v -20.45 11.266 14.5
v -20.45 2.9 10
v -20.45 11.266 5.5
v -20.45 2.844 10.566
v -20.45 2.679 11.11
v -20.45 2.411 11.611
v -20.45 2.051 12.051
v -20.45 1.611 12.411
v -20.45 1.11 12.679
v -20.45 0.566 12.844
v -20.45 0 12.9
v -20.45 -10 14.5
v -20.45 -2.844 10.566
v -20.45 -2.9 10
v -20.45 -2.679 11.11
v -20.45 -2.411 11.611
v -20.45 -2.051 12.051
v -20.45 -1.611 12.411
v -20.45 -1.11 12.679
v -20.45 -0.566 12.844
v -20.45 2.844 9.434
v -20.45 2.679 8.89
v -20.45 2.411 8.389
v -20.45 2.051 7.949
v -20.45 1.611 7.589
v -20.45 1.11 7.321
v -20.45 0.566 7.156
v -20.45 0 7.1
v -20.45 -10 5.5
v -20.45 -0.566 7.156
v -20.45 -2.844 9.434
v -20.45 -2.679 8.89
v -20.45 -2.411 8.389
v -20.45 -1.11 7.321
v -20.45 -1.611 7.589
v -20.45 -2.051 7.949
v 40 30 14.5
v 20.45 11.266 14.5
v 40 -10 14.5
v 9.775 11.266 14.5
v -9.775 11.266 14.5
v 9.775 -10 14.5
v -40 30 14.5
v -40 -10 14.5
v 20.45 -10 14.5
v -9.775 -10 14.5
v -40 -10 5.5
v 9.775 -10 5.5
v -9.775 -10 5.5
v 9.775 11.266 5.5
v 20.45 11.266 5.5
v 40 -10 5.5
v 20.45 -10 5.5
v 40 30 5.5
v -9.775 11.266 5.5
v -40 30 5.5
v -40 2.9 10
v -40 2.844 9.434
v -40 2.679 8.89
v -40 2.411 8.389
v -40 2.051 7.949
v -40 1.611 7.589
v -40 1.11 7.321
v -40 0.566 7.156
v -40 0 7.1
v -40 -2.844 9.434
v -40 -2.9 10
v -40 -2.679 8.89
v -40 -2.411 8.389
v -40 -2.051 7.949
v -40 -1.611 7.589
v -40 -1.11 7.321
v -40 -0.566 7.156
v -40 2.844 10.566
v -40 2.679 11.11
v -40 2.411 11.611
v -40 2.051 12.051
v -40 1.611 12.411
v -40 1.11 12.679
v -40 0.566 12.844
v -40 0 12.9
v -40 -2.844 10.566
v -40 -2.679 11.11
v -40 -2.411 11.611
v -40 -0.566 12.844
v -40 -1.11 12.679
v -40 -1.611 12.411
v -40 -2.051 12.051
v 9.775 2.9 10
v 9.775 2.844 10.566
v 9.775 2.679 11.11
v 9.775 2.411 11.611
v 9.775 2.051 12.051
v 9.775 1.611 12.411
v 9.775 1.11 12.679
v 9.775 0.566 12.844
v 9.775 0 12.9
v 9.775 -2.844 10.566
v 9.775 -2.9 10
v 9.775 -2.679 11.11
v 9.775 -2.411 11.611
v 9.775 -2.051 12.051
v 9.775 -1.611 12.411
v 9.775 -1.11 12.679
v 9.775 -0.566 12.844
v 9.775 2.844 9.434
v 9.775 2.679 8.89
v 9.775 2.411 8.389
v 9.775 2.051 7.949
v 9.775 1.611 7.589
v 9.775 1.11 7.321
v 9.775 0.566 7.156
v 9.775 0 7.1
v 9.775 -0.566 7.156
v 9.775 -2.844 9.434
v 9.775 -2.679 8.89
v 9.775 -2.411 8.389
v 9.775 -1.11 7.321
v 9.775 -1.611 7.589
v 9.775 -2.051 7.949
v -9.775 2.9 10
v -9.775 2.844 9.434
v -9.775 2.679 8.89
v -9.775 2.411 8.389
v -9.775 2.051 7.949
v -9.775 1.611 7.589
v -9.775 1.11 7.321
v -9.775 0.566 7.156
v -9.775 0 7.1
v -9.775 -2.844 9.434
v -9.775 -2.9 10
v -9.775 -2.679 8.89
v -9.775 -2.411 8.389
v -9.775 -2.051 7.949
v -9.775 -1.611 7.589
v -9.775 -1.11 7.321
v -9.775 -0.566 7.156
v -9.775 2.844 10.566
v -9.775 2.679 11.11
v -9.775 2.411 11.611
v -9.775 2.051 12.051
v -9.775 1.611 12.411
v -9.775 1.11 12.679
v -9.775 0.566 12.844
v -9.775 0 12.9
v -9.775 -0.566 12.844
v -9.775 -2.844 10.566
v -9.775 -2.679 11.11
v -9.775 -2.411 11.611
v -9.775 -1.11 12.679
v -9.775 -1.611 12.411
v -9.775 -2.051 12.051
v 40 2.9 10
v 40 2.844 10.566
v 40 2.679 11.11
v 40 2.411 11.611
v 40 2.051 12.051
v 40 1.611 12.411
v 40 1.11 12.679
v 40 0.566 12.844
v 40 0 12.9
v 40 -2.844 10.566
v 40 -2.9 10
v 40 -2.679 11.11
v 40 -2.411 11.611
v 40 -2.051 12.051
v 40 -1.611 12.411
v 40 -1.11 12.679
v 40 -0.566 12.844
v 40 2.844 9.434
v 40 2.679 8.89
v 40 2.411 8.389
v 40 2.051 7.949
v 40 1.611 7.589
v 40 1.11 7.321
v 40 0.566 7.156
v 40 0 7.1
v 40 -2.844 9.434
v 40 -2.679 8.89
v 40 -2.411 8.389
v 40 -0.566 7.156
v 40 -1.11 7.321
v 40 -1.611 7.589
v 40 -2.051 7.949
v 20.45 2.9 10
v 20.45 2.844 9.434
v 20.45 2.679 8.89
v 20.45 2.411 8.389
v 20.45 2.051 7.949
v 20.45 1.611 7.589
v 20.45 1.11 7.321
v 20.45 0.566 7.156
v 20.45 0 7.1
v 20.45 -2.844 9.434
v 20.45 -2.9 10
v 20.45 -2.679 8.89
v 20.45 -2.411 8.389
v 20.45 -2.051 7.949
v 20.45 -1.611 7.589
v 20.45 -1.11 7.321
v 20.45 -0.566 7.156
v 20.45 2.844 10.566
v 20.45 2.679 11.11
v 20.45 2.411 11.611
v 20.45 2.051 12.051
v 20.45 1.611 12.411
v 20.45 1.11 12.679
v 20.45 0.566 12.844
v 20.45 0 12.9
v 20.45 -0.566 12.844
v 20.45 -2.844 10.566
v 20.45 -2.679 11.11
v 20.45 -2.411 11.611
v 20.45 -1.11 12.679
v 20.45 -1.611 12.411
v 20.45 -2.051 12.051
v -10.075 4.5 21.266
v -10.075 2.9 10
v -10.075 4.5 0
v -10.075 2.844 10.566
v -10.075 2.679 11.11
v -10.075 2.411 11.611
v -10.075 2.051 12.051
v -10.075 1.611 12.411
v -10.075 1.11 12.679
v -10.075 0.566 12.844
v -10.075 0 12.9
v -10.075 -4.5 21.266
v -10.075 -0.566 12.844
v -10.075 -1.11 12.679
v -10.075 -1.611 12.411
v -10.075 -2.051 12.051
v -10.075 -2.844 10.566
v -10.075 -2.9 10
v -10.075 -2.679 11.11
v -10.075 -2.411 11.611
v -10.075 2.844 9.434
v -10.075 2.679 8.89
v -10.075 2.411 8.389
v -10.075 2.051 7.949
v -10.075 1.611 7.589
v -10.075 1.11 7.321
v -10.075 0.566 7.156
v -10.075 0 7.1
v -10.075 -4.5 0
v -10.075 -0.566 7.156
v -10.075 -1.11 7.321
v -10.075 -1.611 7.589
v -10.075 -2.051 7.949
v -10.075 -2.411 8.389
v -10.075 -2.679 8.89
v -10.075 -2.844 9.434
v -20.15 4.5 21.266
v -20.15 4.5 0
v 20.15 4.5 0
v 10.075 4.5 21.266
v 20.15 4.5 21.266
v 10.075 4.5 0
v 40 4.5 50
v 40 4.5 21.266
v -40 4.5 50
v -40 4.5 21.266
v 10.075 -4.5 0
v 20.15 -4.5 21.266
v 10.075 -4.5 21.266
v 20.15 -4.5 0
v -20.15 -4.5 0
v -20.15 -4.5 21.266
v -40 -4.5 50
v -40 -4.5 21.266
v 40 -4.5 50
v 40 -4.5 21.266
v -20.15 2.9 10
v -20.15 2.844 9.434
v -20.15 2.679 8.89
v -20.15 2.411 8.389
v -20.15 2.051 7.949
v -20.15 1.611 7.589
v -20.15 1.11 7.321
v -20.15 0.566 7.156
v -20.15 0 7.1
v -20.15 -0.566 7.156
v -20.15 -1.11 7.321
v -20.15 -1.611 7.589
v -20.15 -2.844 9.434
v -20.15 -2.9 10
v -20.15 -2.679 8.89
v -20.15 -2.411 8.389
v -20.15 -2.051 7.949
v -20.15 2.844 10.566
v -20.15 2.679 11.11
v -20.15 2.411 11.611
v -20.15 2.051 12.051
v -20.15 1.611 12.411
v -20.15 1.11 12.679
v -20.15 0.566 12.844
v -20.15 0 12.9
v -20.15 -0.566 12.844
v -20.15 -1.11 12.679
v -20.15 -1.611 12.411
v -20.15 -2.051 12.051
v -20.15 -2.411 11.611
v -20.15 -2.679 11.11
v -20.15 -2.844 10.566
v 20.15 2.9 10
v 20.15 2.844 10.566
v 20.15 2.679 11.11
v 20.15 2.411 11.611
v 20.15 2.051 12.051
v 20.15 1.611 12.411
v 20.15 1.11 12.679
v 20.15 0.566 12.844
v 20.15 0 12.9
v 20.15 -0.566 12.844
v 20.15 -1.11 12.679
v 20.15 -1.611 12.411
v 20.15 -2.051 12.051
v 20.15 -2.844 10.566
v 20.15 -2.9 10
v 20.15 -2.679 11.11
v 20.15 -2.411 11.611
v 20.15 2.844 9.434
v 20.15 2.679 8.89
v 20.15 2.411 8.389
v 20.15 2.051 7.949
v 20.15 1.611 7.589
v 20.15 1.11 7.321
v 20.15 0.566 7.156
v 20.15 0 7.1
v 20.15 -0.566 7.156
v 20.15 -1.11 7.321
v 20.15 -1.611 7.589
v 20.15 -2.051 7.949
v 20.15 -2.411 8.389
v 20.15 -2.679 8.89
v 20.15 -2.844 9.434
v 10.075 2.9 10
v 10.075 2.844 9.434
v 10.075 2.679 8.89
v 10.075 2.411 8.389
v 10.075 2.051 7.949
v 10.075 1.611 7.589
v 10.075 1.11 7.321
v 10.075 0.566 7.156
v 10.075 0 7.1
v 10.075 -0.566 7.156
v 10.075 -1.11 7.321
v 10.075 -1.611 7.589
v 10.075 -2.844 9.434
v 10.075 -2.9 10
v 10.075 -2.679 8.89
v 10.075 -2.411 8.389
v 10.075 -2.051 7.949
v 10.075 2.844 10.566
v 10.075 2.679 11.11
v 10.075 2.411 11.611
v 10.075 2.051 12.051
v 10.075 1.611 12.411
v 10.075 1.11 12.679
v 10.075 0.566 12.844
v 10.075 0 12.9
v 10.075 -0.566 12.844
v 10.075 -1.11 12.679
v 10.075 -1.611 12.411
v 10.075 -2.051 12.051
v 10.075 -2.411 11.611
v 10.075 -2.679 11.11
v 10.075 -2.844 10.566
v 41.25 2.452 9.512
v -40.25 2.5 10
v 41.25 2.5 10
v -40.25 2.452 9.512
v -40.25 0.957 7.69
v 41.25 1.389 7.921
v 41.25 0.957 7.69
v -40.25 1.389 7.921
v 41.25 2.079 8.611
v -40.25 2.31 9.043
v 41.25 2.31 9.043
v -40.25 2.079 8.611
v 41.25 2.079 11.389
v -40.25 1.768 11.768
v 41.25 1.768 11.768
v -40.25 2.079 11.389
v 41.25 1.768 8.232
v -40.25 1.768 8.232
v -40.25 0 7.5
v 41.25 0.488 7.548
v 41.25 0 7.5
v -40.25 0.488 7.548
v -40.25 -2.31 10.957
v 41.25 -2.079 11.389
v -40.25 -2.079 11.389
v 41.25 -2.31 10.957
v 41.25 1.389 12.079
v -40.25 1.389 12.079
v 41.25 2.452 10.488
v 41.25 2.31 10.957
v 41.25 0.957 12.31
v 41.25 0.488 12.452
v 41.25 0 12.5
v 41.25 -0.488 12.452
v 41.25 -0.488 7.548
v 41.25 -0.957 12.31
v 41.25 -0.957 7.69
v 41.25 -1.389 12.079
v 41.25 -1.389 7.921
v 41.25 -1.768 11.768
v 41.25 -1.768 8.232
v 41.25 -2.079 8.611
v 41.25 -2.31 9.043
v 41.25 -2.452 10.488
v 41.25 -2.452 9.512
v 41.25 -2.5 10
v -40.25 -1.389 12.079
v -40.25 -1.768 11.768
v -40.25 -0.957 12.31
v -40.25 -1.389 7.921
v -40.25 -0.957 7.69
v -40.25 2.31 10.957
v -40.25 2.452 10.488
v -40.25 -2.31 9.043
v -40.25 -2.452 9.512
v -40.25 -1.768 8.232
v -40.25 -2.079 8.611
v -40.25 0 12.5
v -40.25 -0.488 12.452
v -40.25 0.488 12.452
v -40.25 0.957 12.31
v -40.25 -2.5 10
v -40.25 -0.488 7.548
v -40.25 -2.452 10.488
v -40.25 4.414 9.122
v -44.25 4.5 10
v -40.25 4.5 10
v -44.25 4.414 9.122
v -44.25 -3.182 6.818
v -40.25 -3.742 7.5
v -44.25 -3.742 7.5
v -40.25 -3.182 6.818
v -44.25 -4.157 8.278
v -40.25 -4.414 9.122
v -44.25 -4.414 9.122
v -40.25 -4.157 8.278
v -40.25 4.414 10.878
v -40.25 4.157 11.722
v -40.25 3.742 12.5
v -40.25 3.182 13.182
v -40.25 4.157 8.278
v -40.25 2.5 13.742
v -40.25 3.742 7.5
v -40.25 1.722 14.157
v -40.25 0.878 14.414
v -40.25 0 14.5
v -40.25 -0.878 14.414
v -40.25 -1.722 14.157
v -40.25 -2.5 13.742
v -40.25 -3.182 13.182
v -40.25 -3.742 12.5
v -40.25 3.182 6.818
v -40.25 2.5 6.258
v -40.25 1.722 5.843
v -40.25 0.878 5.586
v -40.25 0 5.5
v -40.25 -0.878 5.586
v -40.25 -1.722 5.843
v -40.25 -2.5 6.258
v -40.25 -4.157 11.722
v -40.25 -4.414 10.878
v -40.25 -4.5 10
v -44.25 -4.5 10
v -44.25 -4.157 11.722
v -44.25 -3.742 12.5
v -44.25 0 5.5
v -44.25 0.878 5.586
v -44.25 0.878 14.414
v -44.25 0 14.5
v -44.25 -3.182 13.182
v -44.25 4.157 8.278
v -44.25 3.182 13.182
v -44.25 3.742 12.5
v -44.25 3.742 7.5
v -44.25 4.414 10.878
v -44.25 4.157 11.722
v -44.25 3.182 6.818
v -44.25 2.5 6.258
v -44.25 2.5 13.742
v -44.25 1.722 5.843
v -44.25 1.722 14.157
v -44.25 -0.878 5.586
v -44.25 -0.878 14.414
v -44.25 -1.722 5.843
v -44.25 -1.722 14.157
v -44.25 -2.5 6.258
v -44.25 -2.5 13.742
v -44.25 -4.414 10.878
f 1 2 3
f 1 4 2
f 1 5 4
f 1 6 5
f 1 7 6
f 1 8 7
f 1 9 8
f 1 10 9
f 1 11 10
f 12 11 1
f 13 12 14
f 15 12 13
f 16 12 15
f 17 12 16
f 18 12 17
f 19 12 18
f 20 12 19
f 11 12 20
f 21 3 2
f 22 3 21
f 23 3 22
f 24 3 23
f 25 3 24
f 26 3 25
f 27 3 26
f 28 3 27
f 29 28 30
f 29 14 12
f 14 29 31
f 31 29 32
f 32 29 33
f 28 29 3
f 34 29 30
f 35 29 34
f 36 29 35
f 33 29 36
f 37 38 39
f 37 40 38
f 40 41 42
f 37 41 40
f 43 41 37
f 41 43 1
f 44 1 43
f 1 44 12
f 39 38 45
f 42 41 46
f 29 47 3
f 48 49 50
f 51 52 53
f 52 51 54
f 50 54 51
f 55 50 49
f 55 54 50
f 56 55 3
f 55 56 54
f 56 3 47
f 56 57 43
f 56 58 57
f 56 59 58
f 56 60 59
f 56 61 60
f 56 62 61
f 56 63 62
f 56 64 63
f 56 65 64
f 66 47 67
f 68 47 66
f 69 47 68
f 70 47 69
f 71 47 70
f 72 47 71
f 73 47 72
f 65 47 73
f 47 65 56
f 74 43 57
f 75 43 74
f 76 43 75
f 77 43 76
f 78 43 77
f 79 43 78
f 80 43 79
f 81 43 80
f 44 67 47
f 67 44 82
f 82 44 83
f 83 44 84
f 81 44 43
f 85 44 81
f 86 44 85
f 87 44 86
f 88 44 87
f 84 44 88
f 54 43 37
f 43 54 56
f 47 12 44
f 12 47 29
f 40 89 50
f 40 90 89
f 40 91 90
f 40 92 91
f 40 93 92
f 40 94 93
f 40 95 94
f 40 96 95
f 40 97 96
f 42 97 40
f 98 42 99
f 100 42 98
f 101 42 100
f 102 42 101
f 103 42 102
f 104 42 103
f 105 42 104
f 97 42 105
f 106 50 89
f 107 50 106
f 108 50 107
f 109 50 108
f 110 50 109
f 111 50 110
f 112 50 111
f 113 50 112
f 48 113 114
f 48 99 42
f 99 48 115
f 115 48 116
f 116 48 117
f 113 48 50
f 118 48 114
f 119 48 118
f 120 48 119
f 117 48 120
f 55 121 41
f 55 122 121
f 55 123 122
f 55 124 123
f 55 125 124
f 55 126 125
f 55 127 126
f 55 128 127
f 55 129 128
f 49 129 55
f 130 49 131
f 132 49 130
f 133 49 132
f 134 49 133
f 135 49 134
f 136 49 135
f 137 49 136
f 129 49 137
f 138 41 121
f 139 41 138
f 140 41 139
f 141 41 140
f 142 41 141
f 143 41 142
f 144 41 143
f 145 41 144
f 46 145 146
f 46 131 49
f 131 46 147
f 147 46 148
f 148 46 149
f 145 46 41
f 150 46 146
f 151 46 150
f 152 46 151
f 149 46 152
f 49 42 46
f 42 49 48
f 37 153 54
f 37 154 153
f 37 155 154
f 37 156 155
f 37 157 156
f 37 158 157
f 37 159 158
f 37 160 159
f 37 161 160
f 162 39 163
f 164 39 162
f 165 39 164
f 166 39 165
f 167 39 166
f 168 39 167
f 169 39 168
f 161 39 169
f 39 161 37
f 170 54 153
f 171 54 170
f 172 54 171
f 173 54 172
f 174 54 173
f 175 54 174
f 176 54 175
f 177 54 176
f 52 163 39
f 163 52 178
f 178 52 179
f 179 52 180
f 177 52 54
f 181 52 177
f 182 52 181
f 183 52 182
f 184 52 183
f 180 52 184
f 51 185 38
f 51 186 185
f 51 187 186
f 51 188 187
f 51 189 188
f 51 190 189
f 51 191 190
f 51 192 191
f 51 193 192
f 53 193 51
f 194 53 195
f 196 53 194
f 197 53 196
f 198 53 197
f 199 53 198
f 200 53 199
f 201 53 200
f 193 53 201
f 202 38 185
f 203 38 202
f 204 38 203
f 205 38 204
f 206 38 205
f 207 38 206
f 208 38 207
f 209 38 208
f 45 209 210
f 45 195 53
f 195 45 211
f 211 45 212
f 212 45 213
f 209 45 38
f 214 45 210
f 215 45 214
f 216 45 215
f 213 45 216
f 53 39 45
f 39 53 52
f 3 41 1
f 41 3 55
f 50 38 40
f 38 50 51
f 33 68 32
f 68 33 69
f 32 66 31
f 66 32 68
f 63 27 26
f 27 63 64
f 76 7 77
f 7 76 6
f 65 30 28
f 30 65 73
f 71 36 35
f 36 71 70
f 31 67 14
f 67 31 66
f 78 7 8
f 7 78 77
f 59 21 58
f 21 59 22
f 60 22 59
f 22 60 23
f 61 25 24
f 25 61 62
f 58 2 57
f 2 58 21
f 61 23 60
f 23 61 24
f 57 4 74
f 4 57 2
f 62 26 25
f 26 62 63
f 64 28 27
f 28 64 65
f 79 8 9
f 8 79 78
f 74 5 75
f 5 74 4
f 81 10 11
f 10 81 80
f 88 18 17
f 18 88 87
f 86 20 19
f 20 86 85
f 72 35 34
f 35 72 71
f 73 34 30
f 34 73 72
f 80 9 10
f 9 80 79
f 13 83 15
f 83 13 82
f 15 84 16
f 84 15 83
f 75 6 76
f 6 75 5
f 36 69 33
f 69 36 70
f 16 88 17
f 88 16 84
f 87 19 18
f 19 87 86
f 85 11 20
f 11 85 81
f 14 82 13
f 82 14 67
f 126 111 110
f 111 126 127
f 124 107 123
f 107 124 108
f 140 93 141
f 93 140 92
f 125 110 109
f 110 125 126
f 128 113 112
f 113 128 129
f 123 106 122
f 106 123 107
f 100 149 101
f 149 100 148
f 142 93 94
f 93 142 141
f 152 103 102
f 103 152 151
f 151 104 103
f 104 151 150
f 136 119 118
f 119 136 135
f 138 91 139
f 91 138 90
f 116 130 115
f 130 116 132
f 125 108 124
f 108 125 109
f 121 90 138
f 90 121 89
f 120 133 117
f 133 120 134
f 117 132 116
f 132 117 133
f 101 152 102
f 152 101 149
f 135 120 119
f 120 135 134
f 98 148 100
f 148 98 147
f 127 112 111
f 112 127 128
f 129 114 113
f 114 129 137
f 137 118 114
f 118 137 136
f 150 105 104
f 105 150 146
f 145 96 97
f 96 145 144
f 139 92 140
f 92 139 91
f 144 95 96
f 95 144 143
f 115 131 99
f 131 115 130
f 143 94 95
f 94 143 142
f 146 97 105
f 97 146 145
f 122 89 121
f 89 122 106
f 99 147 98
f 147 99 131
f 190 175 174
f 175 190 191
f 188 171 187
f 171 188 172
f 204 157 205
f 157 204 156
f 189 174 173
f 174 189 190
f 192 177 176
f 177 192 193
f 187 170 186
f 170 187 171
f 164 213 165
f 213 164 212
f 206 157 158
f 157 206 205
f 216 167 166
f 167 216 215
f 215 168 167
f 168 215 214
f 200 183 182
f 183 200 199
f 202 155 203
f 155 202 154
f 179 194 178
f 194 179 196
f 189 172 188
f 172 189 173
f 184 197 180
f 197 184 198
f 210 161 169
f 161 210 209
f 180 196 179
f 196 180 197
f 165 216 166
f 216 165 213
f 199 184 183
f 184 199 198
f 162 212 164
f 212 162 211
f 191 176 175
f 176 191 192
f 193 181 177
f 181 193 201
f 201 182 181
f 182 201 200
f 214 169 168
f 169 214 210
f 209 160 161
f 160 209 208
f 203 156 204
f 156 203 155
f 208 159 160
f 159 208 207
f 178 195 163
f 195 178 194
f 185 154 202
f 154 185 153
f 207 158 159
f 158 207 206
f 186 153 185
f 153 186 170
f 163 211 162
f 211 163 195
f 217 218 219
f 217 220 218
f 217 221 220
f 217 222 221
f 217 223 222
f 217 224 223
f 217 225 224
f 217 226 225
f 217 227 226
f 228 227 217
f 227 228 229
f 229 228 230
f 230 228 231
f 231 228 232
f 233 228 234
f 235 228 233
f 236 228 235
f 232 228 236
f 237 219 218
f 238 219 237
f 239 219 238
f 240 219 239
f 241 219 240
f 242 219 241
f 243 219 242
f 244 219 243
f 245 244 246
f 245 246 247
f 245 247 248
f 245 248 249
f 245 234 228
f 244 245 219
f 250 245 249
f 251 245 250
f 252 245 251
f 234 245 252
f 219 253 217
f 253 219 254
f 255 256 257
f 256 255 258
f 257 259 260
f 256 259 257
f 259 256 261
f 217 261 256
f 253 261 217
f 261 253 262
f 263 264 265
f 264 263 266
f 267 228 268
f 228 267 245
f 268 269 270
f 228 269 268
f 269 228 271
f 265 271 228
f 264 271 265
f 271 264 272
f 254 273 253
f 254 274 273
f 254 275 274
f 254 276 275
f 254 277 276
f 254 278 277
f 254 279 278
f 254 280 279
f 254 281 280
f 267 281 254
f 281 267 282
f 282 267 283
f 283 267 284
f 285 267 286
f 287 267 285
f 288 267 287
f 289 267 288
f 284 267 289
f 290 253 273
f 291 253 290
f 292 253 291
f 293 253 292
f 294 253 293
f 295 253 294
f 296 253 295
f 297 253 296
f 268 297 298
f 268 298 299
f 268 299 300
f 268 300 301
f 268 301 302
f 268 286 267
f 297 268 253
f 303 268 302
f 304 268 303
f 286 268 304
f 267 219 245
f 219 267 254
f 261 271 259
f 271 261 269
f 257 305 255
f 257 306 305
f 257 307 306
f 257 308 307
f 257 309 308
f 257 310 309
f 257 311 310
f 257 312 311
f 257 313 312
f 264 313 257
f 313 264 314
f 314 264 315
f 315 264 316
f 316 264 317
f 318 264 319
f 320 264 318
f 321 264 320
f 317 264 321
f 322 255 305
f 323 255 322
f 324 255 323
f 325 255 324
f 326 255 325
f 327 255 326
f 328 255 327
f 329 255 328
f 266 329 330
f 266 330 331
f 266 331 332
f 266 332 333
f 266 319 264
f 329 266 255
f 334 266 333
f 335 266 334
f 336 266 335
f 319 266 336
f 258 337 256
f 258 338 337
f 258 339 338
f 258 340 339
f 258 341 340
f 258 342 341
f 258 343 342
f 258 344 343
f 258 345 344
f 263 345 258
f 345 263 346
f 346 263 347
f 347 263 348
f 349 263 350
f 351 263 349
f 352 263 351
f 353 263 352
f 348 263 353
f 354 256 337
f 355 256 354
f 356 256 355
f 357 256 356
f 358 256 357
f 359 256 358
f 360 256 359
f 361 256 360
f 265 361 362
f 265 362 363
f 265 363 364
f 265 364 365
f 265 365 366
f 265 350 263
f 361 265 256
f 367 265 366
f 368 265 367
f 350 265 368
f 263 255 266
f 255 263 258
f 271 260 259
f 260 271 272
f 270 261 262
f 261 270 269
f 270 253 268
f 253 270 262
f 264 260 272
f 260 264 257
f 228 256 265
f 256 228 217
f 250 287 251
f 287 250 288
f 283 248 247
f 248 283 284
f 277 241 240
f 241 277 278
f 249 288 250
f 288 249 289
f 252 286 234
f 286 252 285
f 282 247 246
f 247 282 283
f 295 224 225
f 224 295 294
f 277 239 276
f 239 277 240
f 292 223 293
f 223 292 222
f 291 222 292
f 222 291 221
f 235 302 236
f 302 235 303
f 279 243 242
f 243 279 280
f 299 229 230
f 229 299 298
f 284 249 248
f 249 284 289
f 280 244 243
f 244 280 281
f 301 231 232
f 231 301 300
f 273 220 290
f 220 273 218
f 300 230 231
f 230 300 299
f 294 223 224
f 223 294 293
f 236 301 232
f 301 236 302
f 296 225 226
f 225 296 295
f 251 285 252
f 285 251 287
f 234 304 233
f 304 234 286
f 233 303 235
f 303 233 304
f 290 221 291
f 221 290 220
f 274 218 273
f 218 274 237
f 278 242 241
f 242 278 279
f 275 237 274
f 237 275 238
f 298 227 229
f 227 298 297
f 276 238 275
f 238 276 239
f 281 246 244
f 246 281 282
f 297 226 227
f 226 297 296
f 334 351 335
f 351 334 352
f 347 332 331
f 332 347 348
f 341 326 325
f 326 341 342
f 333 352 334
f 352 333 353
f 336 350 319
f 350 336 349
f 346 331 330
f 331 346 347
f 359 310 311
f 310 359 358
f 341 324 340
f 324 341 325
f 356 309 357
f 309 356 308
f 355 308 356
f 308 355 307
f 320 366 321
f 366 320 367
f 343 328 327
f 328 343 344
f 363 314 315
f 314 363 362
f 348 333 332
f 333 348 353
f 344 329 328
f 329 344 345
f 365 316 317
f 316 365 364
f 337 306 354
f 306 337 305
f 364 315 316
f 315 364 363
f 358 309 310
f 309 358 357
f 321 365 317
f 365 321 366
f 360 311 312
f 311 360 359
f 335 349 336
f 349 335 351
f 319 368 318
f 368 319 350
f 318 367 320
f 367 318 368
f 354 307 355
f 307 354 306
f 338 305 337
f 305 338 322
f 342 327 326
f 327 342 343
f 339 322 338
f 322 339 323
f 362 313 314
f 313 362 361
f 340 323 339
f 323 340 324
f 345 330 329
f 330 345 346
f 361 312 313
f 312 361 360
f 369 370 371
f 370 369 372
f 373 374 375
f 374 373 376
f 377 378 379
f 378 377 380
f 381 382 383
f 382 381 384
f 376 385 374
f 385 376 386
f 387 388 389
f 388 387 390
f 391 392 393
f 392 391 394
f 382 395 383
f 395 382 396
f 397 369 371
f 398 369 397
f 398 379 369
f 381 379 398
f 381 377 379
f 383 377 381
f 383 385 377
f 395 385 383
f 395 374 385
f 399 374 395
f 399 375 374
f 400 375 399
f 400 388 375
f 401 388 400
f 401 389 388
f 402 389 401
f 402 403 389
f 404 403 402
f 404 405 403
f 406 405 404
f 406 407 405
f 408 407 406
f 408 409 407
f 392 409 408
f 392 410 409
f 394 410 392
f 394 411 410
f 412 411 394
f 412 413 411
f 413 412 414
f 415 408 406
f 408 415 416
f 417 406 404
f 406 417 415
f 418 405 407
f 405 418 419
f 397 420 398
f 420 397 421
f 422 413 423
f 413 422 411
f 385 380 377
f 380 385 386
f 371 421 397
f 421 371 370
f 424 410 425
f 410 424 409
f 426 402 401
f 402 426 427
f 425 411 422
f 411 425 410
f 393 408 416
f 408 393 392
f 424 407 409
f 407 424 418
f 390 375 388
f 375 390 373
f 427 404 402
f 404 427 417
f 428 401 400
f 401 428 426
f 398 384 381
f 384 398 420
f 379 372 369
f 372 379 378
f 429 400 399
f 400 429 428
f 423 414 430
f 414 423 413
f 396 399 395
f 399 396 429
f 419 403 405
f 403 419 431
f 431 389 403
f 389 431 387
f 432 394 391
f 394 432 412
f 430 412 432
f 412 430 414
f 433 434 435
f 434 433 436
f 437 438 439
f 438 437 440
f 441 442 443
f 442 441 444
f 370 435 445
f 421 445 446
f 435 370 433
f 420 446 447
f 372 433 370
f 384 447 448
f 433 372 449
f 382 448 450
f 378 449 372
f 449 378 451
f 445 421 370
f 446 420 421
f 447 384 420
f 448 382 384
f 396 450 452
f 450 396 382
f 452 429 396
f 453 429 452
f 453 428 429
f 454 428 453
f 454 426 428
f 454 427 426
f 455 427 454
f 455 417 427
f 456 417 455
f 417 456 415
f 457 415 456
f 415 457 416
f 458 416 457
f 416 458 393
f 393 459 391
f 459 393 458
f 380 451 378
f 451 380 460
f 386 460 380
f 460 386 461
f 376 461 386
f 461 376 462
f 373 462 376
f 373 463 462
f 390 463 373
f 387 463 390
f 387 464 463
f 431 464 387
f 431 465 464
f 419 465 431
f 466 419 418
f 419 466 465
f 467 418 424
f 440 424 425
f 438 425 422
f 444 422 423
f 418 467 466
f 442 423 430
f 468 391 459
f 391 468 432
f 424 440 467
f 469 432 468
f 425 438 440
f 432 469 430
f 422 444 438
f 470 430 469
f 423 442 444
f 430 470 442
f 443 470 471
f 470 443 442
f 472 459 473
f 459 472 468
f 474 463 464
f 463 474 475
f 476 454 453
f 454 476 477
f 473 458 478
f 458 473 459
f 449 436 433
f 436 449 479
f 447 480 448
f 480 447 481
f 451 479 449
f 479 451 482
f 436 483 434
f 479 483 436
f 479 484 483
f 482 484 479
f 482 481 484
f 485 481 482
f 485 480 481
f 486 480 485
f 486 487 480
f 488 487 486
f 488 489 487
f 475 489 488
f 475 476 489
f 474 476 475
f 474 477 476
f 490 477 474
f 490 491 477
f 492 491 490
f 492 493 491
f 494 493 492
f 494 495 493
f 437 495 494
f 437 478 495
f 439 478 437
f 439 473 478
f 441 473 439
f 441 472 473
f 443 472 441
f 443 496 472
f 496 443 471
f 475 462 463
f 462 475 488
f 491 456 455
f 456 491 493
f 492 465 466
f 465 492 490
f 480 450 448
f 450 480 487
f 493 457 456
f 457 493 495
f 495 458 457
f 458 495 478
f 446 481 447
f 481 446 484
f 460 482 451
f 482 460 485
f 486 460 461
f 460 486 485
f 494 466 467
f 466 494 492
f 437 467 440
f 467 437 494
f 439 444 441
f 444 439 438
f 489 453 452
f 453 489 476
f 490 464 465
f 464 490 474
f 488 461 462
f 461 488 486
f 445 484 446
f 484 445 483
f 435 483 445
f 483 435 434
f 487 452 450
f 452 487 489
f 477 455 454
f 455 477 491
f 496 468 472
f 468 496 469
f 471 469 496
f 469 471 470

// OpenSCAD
$fn = 32;

// ------------------------------------------------------------------------
// Butt hinge: hinge 80 mm, leaf swung 270 deg
// Every part is its own module, assembly() places every instance.
// ------------------------------------------------------------------------

// --- part 1 ---
module hinge_base() {
  difference() {
    union() {
      translate([-40, -10, -4.5]) cube([19.55, 40, 9]);
      translate([-9.775, -10, -4.5]) cube([19.55, 40, 9]);
      translate([20.45, -10, -4.5]) cube([19.55, 40, 9]);
      translate([-40, 11.266, -4.5]) cube([80, 18.734, 9]);
    }
    translate([-30.225, 0, 0]) rotate([0, 90, 0]) cylinder(h = 21.55, d = 5.8, center = true);
    translate([0, 0, 0]) rotate([0, 90, 0]) cylinder(h = 21.55, d = 5.8, center = true);
    translate([30.225, 0, 0]) rotate([0, 90, 0]) cylinder(h = 21.55, d = 5.8, center = true);
  }
}

// --- part 2 ---
module hinge_mover() {
  difference() {
    union() {
      translate([-20.15, -40, -4.5]) cube([10.075, 50, 9]);
      translate([10.075, -40, -4.5]) cube([10.075, 50, 9]);
      translate([-40, -40, -4.5]) cube([80, 28.734, 9]);
    }
    translate([-15.113, 0, 0]) rotate([0, 90, 0]) cylinder(h = 12.075, d = 5.8, center = true);
    translate([15.113, 0, 0]) rotate([0, 90, 0]) cylinder(h = 12.075, d = 5.8, center = true);
  }
}

// --- part 3 ---
module hinge_pin() {
  rotate([0, 90, 0]) cylinder(h = 82.5, d = 5, center = true);
  translate([-44.25, 0, 0]) rotate([0, 90, 0]) cylinder(h = 4, d = 9);
}

// --- assembly ---
module assembly() {
  color([0.80, 0.24, 0.20]) translate([0, 0, 10]) rotate([0, 0, 0]) hinge_base();
  color([0.20, 0.45, 0.75]) translate([0, 0, 10]) rotate([270, 0, 0]) hinge_mover();
  color([0.25, 0.62, 0.32]) translate([0, 0, 10]) rotate([0, 0, 0]) hinge_pin();
}

assembly();
